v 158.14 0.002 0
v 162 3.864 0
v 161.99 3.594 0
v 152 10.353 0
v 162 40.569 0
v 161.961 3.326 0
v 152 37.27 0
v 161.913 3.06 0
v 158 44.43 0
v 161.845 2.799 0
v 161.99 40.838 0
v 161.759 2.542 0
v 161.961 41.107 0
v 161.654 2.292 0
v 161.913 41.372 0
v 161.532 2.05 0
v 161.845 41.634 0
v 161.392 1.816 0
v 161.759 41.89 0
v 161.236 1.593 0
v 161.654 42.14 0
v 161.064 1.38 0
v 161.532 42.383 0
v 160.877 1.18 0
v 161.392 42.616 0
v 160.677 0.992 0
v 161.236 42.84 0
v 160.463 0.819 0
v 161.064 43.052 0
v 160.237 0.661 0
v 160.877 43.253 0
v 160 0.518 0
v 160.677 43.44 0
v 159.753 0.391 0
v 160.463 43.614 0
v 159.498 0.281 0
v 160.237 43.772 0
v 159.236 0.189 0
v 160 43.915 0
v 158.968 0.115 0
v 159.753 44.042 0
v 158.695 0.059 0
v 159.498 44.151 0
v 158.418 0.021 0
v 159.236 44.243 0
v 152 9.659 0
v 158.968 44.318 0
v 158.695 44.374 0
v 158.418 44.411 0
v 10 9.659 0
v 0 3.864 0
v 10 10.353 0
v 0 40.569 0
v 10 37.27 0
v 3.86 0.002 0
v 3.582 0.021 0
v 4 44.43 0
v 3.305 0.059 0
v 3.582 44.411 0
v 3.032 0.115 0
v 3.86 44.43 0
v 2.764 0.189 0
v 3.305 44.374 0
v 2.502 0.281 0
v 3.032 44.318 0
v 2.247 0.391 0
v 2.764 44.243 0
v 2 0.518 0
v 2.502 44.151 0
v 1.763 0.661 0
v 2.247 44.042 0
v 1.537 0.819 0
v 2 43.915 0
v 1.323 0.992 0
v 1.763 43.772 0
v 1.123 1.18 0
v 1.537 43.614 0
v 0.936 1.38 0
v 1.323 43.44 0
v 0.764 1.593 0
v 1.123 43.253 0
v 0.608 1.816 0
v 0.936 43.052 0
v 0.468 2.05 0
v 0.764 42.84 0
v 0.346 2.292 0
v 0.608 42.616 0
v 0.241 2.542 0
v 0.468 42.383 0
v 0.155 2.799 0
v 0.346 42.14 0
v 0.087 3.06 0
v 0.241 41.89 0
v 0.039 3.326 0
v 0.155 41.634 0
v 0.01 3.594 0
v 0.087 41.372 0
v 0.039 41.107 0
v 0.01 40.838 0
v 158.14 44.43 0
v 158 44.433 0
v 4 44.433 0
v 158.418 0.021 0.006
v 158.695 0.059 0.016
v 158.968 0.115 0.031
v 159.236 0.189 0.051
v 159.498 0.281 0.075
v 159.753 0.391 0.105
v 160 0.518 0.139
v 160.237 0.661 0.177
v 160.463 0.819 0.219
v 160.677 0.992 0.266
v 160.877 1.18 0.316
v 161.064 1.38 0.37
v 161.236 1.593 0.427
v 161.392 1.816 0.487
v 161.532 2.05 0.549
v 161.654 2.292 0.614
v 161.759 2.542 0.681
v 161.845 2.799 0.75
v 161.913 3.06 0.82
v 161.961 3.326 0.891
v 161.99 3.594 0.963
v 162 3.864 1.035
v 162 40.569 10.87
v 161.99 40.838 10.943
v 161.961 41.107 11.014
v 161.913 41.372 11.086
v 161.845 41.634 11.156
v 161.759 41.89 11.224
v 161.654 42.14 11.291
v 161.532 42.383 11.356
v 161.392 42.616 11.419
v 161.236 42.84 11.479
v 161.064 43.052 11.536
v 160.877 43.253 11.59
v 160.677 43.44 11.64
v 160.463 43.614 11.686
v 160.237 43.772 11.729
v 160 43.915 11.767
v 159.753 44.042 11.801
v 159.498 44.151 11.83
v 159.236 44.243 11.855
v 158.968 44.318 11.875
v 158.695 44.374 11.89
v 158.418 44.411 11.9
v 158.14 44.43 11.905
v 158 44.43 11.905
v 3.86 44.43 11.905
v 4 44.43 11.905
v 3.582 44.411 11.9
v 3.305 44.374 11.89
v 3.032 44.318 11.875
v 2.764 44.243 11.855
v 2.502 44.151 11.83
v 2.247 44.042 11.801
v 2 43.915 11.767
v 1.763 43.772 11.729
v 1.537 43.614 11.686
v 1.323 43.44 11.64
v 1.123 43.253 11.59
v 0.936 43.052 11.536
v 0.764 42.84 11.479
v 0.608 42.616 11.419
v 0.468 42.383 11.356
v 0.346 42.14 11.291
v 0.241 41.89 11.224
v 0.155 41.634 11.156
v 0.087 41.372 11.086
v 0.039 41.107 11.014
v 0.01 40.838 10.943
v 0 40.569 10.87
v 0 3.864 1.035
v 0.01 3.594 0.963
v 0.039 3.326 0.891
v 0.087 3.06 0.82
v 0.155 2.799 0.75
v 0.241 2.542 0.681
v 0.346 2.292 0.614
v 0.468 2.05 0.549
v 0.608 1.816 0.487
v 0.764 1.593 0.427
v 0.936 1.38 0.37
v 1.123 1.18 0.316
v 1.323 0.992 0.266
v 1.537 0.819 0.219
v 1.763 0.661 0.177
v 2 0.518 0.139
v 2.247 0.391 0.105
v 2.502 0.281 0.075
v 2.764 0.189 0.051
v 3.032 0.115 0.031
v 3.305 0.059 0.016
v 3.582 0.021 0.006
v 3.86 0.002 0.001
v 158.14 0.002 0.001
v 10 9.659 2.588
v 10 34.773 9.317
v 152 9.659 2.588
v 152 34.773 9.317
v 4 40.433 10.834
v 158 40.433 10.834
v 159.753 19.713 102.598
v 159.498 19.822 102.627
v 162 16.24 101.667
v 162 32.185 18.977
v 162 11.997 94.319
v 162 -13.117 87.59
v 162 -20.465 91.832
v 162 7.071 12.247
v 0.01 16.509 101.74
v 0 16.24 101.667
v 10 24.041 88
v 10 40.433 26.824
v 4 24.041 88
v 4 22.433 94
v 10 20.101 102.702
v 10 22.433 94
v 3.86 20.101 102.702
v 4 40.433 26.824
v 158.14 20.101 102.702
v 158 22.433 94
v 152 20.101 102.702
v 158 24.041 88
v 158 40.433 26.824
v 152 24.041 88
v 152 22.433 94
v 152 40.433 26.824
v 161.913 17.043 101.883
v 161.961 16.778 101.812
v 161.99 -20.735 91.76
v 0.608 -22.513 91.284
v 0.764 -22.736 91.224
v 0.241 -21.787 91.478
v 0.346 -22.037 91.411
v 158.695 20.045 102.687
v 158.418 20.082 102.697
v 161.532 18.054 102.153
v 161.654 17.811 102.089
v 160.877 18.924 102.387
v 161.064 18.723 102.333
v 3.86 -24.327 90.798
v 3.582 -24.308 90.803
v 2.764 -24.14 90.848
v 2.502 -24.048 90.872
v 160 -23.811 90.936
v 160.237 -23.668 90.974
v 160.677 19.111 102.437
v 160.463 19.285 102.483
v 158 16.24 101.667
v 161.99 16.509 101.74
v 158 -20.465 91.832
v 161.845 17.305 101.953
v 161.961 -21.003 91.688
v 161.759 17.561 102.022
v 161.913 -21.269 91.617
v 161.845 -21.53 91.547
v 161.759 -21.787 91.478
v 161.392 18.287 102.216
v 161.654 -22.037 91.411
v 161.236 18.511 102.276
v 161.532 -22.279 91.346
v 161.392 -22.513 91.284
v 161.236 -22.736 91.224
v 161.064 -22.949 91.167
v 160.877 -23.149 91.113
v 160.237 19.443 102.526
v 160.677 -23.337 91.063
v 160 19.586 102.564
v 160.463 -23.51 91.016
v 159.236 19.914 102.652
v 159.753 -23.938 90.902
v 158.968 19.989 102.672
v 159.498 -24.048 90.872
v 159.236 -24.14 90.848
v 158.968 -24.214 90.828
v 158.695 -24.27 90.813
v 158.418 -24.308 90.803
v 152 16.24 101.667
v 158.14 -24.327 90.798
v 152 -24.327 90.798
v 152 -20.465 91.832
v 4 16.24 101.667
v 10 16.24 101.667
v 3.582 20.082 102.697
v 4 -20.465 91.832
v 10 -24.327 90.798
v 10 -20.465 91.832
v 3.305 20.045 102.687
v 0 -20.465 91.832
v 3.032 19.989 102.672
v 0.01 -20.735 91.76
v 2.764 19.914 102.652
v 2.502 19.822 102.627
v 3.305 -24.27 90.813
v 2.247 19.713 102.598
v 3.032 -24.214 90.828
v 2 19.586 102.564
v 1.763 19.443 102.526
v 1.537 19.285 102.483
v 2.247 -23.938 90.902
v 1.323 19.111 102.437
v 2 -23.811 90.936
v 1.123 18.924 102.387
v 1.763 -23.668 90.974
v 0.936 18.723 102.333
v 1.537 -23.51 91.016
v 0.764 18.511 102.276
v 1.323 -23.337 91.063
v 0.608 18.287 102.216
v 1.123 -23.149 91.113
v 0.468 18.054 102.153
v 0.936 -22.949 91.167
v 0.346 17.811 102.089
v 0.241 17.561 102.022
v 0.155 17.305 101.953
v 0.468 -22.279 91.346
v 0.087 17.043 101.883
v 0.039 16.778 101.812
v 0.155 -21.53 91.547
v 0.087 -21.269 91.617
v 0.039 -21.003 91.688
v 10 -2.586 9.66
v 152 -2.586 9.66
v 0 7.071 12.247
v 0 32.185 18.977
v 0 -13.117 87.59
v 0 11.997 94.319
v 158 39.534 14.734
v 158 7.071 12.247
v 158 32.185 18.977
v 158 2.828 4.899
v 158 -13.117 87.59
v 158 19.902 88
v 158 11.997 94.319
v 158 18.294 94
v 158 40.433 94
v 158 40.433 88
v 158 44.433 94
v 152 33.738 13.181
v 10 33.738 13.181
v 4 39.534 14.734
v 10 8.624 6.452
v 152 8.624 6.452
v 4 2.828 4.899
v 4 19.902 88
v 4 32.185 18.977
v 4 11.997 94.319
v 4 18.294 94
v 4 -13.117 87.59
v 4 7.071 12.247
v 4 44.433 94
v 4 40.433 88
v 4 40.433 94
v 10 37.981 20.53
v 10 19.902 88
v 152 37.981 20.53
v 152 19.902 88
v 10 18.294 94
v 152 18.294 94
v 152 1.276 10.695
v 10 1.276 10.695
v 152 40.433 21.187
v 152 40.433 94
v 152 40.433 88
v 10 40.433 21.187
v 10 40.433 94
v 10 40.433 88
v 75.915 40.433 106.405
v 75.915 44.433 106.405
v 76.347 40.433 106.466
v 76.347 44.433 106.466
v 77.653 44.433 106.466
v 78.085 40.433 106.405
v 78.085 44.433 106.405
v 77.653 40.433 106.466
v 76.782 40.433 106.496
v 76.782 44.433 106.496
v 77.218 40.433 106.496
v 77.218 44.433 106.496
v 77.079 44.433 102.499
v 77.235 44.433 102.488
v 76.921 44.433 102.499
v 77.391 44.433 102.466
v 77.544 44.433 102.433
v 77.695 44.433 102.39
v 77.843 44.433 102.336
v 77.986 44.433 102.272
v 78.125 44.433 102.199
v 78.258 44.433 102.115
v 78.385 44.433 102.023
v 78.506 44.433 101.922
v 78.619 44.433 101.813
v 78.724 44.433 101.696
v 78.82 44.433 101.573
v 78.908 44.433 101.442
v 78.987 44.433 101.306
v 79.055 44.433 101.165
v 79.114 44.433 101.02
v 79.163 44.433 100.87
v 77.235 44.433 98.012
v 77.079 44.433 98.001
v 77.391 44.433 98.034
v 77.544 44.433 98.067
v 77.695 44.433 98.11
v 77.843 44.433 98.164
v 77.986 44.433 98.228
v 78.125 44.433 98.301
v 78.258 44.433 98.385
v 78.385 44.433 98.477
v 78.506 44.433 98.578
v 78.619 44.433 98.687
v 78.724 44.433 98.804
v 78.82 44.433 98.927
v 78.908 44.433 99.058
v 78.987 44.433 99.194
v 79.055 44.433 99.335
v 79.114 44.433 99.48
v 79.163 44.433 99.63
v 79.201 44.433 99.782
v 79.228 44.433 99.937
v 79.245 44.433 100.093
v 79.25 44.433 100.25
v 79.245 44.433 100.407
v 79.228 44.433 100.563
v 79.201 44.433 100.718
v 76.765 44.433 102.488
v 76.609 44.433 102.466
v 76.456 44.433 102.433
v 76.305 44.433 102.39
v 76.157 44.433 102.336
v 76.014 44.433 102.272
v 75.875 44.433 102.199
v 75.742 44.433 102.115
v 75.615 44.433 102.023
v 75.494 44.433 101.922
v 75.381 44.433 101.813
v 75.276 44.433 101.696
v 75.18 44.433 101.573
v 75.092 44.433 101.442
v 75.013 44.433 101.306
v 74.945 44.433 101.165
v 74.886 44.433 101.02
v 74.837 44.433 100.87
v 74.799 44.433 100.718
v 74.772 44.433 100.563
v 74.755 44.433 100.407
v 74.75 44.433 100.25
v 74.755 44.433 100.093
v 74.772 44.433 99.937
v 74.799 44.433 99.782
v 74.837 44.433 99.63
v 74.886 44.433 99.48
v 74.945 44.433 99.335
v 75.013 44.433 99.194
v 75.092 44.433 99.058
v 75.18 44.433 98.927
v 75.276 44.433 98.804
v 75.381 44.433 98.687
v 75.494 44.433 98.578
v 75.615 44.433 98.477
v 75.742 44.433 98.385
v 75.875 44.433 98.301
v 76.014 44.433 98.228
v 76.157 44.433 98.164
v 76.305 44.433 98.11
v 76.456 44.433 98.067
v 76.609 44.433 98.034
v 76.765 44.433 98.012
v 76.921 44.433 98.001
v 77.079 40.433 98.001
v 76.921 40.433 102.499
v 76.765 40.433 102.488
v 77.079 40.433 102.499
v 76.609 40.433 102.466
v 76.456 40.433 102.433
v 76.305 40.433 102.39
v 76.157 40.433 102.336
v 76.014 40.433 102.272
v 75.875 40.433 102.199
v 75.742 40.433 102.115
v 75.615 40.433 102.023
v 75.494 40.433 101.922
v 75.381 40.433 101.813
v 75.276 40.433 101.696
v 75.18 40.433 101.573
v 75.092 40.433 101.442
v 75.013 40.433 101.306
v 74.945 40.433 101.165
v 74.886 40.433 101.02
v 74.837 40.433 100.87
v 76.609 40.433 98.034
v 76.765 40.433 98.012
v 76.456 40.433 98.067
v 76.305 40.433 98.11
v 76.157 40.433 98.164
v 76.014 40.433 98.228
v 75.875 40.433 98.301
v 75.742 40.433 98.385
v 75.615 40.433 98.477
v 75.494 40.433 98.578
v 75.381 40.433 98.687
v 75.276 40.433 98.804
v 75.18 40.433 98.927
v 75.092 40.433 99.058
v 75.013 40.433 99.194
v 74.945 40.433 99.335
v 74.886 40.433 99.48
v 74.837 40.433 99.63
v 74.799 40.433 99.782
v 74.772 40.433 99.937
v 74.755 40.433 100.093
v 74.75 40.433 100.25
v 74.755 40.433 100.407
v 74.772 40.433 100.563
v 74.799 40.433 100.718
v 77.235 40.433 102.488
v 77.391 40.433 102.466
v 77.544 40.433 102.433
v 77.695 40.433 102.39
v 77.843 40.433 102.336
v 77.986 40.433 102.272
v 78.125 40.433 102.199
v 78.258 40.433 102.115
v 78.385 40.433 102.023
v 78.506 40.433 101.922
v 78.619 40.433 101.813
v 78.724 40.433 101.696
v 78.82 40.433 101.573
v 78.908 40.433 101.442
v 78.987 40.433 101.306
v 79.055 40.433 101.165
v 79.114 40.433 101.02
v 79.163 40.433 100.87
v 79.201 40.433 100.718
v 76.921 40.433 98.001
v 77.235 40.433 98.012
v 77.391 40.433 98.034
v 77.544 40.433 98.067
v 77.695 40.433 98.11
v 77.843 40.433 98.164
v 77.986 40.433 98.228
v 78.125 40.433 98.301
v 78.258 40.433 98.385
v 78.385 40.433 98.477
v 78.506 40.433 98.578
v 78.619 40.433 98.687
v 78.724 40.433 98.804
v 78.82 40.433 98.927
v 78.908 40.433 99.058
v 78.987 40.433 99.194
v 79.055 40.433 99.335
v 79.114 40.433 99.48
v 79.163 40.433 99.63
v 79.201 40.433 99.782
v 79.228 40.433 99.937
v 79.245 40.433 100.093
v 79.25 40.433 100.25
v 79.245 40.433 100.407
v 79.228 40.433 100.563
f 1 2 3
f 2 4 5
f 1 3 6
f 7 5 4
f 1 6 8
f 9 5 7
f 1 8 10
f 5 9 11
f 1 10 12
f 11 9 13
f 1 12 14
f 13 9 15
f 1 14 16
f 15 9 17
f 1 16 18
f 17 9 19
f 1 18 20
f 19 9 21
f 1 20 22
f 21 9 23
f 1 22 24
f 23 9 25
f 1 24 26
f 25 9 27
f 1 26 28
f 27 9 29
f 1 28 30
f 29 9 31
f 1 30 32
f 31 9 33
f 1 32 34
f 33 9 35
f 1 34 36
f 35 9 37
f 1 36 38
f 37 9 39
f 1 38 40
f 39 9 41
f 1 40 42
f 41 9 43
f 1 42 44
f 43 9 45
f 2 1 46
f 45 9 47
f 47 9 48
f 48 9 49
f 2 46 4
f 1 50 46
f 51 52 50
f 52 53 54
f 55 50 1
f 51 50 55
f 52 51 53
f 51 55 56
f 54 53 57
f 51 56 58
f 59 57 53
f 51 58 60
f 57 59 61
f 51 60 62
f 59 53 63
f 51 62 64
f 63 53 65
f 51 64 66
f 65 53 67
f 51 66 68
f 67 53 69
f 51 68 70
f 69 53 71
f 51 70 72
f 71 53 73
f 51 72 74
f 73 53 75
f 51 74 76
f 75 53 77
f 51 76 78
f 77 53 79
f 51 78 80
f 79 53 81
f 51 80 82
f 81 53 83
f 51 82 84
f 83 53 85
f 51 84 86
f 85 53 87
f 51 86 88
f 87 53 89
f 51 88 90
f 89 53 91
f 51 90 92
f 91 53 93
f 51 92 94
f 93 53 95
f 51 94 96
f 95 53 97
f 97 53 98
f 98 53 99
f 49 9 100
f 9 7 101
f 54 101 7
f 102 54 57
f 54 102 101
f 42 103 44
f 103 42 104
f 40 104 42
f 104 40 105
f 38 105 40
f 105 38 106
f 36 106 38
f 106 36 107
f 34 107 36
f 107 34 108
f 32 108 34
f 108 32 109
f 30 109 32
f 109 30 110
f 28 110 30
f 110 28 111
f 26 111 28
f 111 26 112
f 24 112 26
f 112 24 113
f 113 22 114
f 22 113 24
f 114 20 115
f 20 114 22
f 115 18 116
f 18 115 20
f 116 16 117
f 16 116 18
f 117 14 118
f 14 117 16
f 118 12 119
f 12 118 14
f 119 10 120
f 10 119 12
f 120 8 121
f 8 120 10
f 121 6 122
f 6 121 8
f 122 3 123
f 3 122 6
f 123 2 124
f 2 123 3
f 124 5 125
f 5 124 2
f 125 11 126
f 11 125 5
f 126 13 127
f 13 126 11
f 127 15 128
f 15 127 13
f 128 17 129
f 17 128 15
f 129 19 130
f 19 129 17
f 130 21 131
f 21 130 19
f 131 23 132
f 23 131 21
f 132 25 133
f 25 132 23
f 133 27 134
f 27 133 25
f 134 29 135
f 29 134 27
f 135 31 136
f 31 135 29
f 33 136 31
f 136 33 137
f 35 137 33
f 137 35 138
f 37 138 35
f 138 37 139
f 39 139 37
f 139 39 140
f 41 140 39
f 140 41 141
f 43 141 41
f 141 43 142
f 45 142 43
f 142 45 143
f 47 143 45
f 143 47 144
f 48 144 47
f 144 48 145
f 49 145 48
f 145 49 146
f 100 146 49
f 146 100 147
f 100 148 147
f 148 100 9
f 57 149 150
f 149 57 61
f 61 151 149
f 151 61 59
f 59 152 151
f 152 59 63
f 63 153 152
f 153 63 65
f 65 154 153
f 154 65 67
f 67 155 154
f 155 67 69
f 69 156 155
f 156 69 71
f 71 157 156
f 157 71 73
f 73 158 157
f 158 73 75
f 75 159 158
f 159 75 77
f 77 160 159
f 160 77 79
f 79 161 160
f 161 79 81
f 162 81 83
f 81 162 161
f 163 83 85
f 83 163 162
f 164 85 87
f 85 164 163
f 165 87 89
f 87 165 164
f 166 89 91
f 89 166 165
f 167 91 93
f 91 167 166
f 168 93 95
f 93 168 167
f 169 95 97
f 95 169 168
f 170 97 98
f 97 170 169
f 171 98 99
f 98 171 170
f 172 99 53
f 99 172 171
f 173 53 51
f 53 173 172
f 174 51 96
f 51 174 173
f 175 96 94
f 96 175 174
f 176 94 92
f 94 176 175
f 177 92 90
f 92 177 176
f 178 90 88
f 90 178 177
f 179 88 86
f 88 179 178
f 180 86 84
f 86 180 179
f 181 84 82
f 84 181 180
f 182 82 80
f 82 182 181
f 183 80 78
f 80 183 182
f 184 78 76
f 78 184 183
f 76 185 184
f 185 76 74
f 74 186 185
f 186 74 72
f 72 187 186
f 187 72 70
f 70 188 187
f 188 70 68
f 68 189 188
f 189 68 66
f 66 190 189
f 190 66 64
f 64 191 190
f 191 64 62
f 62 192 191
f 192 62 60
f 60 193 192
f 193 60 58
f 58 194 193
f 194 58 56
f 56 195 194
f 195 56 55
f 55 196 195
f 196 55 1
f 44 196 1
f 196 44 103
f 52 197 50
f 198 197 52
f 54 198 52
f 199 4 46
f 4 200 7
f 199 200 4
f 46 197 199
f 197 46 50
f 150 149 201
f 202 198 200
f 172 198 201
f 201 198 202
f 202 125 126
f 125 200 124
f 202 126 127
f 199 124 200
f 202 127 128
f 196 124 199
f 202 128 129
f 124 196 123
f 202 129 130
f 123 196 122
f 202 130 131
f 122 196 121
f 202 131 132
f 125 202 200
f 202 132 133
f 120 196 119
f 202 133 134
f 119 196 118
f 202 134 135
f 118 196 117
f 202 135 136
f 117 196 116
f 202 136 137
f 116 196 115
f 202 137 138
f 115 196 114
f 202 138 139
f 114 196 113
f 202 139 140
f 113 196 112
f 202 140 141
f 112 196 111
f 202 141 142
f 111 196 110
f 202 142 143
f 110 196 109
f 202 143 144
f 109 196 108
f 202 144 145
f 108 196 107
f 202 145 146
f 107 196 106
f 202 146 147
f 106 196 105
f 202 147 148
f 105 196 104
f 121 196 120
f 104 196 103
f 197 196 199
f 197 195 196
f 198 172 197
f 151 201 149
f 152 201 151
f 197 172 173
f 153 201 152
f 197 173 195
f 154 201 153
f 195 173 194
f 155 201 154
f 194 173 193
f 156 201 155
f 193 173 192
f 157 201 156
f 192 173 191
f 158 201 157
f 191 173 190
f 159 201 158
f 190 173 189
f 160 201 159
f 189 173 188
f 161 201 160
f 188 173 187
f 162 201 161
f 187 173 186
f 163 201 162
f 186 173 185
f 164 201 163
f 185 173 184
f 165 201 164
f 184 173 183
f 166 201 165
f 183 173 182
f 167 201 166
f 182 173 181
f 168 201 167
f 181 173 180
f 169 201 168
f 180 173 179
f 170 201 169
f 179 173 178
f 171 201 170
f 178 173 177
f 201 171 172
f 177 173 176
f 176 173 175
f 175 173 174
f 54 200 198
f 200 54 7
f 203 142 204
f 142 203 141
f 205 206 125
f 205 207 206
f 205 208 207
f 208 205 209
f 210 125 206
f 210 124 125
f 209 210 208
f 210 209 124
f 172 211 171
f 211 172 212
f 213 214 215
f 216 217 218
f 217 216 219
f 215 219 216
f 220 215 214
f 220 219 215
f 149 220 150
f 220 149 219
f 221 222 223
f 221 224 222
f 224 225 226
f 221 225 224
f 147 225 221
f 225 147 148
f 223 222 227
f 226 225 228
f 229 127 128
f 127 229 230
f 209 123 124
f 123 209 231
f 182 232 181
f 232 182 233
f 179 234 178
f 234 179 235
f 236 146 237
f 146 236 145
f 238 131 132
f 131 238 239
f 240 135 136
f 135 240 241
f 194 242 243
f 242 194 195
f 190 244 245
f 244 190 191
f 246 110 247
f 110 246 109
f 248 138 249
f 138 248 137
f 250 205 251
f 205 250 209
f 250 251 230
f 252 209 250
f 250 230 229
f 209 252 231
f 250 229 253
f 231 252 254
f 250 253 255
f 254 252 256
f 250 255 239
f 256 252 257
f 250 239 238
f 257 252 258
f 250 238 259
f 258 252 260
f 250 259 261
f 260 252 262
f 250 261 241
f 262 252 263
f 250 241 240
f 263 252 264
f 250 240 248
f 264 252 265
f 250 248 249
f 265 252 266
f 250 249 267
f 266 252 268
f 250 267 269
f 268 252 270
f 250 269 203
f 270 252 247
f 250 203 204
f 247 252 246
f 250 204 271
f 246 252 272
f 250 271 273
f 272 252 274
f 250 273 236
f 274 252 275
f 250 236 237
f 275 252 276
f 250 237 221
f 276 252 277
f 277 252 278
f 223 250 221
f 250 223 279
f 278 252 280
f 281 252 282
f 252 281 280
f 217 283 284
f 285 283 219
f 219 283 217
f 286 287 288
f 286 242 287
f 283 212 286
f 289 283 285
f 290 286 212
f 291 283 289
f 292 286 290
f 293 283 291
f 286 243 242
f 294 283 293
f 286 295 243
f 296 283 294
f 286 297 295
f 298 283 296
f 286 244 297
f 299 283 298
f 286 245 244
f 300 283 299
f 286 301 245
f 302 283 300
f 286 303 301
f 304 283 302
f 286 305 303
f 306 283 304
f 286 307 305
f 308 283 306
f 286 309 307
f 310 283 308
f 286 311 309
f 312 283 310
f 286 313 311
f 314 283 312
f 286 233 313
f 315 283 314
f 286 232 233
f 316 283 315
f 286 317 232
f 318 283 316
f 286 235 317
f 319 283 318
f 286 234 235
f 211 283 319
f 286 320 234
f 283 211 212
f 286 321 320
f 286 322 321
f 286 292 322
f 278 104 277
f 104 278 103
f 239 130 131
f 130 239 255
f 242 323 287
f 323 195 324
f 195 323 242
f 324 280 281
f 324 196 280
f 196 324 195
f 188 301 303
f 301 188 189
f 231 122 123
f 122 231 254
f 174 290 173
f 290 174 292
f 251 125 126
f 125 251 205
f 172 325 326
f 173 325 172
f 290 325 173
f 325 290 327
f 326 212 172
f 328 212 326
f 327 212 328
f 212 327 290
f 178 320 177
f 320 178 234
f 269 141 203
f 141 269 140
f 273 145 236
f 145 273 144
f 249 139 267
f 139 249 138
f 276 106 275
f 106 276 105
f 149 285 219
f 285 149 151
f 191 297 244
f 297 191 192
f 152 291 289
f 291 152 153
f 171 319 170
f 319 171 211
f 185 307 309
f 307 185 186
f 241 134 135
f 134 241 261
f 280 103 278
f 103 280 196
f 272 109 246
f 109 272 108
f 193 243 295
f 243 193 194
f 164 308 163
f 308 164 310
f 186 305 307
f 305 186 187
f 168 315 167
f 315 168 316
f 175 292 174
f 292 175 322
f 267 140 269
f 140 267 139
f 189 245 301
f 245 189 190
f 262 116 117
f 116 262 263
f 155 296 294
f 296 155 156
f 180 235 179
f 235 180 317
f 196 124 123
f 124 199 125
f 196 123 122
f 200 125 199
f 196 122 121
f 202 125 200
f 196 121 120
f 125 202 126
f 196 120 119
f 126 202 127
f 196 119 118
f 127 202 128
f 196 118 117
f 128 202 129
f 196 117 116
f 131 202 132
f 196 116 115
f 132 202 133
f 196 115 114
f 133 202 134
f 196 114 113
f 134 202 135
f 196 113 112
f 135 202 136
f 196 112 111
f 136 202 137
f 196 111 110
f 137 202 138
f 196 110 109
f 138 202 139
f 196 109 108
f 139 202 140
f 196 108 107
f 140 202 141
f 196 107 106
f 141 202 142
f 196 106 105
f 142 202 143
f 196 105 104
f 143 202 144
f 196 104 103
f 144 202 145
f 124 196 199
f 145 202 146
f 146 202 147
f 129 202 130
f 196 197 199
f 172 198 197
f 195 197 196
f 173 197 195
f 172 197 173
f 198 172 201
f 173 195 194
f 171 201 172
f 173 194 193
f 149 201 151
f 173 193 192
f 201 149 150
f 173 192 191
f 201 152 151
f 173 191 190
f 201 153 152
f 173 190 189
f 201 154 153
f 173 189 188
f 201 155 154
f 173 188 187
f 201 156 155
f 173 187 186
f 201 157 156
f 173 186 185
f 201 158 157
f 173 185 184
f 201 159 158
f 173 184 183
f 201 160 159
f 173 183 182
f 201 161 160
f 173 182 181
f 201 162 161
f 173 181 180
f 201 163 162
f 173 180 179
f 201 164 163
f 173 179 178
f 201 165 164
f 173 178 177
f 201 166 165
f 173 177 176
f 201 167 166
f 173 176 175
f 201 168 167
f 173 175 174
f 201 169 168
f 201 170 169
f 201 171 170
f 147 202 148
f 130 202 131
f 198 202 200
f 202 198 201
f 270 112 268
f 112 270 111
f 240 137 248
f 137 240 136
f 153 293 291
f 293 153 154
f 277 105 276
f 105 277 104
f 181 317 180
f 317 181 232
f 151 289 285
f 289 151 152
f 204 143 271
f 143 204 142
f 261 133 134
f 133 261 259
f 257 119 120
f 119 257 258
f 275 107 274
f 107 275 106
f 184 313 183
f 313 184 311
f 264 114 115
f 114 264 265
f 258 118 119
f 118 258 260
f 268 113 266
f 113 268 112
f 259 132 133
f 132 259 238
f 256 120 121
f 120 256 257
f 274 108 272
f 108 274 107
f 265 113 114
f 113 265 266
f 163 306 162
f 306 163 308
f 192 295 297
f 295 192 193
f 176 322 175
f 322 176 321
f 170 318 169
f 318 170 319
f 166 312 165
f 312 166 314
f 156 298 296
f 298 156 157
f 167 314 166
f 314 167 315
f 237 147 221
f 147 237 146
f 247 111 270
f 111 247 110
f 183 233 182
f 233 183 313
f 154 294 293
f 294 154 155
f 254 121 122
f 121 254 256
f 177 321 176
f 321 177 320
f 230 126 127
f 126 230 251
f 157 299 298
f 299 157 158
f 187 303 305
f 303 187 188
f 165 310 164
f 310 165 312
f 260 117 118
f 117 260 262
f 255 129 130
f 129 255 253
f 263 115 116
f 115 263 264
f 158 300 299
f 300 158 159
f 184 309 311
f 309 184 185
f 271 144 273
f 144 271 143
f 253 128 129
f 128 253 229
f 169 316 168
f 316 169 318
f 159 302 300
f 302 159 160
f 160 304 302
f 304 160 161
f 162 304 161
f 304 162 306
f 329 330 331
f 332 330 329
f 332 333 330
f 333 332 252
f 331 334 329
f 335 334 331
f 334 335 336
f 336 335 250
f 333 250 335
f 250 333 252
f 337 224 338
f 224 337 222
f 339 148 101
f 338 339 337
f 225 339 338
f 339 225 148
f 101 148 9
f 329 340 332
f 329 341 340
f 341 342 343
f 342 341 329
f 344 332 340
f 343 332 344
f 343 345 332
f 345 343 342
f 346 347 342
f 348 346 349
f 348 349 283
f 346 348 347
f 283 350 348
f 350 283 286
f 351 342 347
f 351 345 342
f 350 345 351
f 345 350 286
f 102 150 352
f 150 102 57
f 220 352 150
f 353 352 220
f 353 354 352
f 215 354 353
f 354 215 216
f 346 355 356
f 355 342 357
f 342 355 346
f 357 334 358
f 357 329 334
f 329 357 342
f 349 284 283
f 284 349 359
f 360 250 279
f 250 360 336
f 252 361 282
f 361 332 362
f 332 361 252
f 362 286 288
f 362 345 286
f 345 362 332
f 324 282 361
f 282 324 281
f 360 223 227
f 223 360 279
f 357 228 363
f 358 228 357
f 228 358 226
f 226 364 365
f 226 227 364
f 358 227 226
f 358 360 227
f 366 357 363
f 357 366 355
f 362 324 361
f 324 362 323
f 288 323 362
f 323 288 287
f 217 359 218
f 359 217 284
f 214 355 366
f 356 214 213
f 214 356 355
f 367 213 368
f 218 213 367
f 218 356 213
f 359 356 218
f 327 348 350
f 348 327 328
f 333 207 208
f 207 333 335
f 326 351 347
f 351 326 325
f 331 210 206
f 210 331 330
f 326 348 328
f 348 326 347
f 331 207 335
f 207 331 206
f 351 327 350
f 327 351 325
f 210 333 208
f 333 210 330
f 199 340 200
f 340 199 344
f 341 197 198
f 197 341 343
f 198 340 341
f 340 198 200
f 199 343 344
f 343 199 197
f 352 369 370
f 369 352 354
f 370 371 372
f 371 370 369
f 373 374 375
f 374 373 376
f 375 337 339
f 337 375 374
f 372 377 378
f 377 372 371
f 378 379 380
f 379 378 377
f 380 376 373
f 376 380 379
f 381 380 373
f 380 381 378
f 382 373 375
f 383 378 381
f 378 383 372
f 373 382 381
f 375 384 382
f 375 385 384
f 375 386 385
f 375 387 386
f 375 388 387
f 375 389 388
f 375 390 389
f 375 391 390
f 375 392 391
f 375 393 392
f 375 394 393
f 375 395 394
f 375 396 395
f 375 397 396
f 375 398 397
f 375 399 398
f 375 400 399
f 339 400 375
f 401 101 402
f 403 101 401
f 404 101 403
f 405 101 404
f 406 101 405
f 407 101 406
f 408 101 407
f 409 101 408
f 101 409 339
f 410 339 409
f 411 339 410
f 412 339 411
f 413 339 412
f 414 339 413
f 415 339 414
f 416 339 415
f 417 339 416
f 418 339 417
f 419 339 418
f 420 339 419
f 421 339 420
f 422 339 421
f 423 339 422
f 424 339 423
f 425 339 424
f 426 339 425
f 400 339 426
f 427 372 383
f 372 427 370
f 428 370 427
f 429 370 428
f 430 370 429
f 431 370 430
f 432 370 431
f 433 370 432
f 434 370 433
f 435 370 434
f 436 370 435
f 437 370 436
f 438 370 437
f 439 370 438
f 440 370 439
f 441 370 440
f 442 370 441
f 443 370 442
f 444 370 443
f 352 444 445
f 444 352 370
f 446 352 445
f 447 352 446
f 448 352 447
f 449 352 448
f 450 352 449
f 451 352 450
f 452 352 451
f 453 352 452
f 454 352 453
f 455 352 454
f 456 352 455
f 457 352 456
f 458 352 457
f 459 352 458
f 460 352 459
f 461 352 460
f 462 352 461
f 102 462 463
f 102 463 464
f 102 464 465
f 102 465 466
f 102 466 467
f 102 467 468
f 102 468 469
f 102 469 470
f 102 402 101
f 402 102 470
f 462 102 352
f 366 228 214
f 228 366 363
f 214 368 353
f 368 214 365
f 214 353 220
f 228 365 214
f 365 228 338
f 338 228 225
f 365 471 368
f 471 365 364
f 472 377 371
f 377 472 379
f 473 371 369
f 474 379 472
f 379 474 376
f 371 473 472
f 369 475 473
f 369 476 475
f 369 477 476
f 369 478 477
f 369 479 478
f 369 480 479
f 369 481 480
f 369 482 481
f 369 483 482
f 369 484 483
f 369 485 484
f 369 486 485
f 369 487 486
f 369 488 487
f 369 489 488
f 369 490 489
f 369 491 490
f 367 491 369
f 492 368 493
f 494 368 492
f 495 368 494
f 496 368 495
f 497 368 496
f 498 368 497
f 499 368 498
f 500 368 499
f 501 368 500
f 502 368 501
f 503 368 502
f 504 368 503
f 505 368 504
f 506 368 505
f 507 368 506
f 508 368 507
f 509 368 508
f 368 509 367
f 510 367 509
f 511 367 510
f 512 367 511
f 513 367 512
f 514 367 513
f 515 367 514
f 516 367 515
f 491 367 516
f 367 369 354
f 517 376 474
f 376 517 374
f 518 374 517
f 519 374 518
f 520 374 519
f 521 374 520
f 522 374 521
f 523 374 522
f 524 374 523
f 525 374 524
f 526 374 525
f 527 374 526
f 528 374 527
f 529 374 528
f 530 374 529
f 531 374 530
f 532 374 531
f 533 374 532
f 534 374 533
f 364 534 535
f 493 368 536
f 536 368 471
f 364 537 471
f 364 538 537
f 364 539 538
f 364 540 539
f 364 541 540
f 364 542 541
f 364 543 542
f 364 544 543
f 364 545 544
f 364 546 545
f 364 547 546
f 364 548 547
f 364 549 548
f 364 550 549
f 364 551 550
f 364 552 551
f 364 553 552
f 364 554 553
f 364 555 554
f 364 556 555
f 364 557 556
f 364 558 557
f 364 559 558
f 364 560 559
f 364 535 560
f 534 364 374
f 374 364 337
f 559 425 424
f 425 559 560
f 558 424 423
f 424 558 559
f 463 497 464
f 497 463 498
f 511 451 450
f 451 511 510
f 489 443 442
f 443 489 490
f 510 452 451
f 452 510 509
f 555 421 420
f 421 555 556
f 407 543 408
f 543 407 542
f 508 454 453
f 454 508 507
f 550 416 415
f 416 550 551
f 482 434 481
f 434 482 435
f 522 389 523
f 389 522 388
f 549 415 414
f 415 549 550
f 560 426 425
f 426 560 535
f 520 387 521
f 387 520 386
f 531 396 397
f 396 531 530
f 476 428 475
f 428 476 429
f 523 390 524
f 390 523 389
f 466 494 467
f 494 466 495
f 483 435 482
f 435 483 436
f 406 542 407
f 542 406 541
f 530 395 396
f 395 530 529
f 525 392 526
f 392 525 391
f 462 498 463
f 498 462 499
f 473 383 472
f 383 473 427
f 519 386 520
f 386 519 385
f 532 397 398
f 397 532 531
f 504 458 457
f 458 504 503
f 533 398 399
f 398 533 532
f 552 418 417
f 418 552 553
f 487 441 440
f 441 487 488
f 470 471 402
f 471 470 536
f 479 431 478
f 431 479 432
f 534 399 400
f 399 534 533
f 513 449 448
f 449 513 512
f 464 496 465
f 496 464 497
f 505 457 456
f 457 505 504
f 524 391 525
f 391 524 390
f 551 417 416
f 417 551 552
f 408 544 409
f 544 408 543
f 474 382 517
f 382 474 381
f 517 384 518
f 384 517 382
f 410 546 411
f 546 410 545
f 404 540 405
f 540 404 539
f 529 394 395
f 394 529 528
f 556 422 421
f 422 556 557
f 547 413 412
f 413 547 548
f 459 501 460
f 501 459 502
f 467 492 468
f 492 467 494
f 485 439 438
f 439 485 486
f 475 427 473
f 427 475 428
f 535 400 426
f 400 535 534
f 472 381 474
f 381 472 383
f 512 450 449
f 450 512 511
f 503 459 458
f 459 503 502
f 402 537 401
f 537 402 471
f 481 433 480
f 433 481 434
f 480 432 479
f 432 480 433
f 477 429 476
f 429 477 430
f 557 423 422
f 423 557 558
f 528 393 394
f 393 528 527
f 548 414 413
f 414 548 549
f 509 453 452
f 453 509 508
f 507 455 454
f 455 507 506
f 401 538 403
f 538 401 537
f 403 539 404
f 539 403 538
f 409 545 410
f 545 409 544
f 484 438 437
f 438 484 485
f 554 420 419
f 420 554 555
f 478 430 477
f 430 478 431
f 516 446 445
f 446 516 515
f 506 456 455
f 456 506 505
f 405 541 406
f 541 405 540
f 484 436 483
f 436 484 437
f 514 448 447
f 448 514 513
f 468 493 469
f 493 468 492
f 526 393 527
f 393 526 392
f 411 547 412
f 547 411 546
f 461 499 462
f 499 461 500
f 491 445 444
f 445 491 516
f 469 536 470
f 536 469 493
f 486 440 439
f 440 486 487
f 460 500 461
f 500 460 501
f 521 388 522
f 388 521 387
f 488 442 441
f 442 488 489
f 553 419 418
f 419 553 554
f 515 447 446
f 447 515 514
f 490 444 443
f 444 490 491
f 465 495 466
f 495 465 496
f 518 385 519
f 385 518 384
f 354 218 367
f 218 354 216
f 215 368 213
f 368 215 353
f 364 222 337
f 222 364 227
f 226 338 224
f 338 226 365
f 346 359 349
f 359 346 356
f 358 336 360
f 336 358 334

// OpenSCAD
$fn=90;
p_x=154;
p_y=38;
p_z=90;
wall=4;
walll=wall*2;
pad=0.1;
padd=pad*2;

grip=6;
gripp=grip*2;

angle=15;
hyp=p_y+walll;
opp=sin(angle)*hyp;
adj=cos(angle)*hyp;

screw_wall=4;
screw_d=4.5;
screw_wall_d=screw_d+screw_wall*2;
screw_wall_r=screw_wall_d/2;

difference(){
    linear_extrude(height=p_y)
    rotate([angle,0,0])
    projection()
    projector_frame();
    rotate([angle,0,0])
    cube([p_x+walll+padd,p_y*2+walll+padd,p_y]);
    rotate([angle,0,0])
    translate([grip+wall,grip+wall,-p_y])
    cube([p_x-gripp,p_y-gripp,wall+pad+p_y]);
}

rotate([angle,0,0])
projector_frame();

difference() {
    hull() {
        translate([wall,adj-wall,0])
        cube([p_x,wall,p_z+wall]);
        translate([p_x/2,adj,p_z+wall+screw_wall_r])
        rotate([90,0,0])
        cylinder(r=screw_wall_r,h=wall);
    }
    translate([p_x/2,adj+pad,p_z+wall+screw_wall_r])
    rotate([90,0,0])
    cylinder(d=screw_d,h=wall+padd);
}

difference() {
    union() {
        translate([wall,0,p_z+wall-grip])
        cube([grip,adj,grip]);

        translate([p_x+wall-grip,0,p_z+wall-grip])
        cube([grip,adj,grip]);
    }
    rotate([angle,0,0])
    cube([p_x+walll,p_y+wall,p_z+walll]);
}

module projector_frame() {
    translate([wall,wall,0])
    difference() {
        minkowski() {
            cube([p_x,p_y,p_z]);
            cylinder(r=wall,h=wall);
        }
        translate([0,0,wall])
        cube([p_x,p_y,p_z+pad]);
        translate([-wall-pad,-wall-pad,p_z+wall])
        cube([p_x+walll+padd,p_y+walll+padd,wall+pad]);
        translate([grip,-wall-pad,grip+wall])
        cube([p_x-gripp,p_y+walll+padd,p_z]);
        translate([-wall-pad,grip,wall+grip])
        cube([p_x+walll+padd,p_y-gripp,p_z-gripp]);
        translate([grip,grip,-pad])
        cube([p_x-gripp,p_y-gripp,wall+padd]);
    }
}
